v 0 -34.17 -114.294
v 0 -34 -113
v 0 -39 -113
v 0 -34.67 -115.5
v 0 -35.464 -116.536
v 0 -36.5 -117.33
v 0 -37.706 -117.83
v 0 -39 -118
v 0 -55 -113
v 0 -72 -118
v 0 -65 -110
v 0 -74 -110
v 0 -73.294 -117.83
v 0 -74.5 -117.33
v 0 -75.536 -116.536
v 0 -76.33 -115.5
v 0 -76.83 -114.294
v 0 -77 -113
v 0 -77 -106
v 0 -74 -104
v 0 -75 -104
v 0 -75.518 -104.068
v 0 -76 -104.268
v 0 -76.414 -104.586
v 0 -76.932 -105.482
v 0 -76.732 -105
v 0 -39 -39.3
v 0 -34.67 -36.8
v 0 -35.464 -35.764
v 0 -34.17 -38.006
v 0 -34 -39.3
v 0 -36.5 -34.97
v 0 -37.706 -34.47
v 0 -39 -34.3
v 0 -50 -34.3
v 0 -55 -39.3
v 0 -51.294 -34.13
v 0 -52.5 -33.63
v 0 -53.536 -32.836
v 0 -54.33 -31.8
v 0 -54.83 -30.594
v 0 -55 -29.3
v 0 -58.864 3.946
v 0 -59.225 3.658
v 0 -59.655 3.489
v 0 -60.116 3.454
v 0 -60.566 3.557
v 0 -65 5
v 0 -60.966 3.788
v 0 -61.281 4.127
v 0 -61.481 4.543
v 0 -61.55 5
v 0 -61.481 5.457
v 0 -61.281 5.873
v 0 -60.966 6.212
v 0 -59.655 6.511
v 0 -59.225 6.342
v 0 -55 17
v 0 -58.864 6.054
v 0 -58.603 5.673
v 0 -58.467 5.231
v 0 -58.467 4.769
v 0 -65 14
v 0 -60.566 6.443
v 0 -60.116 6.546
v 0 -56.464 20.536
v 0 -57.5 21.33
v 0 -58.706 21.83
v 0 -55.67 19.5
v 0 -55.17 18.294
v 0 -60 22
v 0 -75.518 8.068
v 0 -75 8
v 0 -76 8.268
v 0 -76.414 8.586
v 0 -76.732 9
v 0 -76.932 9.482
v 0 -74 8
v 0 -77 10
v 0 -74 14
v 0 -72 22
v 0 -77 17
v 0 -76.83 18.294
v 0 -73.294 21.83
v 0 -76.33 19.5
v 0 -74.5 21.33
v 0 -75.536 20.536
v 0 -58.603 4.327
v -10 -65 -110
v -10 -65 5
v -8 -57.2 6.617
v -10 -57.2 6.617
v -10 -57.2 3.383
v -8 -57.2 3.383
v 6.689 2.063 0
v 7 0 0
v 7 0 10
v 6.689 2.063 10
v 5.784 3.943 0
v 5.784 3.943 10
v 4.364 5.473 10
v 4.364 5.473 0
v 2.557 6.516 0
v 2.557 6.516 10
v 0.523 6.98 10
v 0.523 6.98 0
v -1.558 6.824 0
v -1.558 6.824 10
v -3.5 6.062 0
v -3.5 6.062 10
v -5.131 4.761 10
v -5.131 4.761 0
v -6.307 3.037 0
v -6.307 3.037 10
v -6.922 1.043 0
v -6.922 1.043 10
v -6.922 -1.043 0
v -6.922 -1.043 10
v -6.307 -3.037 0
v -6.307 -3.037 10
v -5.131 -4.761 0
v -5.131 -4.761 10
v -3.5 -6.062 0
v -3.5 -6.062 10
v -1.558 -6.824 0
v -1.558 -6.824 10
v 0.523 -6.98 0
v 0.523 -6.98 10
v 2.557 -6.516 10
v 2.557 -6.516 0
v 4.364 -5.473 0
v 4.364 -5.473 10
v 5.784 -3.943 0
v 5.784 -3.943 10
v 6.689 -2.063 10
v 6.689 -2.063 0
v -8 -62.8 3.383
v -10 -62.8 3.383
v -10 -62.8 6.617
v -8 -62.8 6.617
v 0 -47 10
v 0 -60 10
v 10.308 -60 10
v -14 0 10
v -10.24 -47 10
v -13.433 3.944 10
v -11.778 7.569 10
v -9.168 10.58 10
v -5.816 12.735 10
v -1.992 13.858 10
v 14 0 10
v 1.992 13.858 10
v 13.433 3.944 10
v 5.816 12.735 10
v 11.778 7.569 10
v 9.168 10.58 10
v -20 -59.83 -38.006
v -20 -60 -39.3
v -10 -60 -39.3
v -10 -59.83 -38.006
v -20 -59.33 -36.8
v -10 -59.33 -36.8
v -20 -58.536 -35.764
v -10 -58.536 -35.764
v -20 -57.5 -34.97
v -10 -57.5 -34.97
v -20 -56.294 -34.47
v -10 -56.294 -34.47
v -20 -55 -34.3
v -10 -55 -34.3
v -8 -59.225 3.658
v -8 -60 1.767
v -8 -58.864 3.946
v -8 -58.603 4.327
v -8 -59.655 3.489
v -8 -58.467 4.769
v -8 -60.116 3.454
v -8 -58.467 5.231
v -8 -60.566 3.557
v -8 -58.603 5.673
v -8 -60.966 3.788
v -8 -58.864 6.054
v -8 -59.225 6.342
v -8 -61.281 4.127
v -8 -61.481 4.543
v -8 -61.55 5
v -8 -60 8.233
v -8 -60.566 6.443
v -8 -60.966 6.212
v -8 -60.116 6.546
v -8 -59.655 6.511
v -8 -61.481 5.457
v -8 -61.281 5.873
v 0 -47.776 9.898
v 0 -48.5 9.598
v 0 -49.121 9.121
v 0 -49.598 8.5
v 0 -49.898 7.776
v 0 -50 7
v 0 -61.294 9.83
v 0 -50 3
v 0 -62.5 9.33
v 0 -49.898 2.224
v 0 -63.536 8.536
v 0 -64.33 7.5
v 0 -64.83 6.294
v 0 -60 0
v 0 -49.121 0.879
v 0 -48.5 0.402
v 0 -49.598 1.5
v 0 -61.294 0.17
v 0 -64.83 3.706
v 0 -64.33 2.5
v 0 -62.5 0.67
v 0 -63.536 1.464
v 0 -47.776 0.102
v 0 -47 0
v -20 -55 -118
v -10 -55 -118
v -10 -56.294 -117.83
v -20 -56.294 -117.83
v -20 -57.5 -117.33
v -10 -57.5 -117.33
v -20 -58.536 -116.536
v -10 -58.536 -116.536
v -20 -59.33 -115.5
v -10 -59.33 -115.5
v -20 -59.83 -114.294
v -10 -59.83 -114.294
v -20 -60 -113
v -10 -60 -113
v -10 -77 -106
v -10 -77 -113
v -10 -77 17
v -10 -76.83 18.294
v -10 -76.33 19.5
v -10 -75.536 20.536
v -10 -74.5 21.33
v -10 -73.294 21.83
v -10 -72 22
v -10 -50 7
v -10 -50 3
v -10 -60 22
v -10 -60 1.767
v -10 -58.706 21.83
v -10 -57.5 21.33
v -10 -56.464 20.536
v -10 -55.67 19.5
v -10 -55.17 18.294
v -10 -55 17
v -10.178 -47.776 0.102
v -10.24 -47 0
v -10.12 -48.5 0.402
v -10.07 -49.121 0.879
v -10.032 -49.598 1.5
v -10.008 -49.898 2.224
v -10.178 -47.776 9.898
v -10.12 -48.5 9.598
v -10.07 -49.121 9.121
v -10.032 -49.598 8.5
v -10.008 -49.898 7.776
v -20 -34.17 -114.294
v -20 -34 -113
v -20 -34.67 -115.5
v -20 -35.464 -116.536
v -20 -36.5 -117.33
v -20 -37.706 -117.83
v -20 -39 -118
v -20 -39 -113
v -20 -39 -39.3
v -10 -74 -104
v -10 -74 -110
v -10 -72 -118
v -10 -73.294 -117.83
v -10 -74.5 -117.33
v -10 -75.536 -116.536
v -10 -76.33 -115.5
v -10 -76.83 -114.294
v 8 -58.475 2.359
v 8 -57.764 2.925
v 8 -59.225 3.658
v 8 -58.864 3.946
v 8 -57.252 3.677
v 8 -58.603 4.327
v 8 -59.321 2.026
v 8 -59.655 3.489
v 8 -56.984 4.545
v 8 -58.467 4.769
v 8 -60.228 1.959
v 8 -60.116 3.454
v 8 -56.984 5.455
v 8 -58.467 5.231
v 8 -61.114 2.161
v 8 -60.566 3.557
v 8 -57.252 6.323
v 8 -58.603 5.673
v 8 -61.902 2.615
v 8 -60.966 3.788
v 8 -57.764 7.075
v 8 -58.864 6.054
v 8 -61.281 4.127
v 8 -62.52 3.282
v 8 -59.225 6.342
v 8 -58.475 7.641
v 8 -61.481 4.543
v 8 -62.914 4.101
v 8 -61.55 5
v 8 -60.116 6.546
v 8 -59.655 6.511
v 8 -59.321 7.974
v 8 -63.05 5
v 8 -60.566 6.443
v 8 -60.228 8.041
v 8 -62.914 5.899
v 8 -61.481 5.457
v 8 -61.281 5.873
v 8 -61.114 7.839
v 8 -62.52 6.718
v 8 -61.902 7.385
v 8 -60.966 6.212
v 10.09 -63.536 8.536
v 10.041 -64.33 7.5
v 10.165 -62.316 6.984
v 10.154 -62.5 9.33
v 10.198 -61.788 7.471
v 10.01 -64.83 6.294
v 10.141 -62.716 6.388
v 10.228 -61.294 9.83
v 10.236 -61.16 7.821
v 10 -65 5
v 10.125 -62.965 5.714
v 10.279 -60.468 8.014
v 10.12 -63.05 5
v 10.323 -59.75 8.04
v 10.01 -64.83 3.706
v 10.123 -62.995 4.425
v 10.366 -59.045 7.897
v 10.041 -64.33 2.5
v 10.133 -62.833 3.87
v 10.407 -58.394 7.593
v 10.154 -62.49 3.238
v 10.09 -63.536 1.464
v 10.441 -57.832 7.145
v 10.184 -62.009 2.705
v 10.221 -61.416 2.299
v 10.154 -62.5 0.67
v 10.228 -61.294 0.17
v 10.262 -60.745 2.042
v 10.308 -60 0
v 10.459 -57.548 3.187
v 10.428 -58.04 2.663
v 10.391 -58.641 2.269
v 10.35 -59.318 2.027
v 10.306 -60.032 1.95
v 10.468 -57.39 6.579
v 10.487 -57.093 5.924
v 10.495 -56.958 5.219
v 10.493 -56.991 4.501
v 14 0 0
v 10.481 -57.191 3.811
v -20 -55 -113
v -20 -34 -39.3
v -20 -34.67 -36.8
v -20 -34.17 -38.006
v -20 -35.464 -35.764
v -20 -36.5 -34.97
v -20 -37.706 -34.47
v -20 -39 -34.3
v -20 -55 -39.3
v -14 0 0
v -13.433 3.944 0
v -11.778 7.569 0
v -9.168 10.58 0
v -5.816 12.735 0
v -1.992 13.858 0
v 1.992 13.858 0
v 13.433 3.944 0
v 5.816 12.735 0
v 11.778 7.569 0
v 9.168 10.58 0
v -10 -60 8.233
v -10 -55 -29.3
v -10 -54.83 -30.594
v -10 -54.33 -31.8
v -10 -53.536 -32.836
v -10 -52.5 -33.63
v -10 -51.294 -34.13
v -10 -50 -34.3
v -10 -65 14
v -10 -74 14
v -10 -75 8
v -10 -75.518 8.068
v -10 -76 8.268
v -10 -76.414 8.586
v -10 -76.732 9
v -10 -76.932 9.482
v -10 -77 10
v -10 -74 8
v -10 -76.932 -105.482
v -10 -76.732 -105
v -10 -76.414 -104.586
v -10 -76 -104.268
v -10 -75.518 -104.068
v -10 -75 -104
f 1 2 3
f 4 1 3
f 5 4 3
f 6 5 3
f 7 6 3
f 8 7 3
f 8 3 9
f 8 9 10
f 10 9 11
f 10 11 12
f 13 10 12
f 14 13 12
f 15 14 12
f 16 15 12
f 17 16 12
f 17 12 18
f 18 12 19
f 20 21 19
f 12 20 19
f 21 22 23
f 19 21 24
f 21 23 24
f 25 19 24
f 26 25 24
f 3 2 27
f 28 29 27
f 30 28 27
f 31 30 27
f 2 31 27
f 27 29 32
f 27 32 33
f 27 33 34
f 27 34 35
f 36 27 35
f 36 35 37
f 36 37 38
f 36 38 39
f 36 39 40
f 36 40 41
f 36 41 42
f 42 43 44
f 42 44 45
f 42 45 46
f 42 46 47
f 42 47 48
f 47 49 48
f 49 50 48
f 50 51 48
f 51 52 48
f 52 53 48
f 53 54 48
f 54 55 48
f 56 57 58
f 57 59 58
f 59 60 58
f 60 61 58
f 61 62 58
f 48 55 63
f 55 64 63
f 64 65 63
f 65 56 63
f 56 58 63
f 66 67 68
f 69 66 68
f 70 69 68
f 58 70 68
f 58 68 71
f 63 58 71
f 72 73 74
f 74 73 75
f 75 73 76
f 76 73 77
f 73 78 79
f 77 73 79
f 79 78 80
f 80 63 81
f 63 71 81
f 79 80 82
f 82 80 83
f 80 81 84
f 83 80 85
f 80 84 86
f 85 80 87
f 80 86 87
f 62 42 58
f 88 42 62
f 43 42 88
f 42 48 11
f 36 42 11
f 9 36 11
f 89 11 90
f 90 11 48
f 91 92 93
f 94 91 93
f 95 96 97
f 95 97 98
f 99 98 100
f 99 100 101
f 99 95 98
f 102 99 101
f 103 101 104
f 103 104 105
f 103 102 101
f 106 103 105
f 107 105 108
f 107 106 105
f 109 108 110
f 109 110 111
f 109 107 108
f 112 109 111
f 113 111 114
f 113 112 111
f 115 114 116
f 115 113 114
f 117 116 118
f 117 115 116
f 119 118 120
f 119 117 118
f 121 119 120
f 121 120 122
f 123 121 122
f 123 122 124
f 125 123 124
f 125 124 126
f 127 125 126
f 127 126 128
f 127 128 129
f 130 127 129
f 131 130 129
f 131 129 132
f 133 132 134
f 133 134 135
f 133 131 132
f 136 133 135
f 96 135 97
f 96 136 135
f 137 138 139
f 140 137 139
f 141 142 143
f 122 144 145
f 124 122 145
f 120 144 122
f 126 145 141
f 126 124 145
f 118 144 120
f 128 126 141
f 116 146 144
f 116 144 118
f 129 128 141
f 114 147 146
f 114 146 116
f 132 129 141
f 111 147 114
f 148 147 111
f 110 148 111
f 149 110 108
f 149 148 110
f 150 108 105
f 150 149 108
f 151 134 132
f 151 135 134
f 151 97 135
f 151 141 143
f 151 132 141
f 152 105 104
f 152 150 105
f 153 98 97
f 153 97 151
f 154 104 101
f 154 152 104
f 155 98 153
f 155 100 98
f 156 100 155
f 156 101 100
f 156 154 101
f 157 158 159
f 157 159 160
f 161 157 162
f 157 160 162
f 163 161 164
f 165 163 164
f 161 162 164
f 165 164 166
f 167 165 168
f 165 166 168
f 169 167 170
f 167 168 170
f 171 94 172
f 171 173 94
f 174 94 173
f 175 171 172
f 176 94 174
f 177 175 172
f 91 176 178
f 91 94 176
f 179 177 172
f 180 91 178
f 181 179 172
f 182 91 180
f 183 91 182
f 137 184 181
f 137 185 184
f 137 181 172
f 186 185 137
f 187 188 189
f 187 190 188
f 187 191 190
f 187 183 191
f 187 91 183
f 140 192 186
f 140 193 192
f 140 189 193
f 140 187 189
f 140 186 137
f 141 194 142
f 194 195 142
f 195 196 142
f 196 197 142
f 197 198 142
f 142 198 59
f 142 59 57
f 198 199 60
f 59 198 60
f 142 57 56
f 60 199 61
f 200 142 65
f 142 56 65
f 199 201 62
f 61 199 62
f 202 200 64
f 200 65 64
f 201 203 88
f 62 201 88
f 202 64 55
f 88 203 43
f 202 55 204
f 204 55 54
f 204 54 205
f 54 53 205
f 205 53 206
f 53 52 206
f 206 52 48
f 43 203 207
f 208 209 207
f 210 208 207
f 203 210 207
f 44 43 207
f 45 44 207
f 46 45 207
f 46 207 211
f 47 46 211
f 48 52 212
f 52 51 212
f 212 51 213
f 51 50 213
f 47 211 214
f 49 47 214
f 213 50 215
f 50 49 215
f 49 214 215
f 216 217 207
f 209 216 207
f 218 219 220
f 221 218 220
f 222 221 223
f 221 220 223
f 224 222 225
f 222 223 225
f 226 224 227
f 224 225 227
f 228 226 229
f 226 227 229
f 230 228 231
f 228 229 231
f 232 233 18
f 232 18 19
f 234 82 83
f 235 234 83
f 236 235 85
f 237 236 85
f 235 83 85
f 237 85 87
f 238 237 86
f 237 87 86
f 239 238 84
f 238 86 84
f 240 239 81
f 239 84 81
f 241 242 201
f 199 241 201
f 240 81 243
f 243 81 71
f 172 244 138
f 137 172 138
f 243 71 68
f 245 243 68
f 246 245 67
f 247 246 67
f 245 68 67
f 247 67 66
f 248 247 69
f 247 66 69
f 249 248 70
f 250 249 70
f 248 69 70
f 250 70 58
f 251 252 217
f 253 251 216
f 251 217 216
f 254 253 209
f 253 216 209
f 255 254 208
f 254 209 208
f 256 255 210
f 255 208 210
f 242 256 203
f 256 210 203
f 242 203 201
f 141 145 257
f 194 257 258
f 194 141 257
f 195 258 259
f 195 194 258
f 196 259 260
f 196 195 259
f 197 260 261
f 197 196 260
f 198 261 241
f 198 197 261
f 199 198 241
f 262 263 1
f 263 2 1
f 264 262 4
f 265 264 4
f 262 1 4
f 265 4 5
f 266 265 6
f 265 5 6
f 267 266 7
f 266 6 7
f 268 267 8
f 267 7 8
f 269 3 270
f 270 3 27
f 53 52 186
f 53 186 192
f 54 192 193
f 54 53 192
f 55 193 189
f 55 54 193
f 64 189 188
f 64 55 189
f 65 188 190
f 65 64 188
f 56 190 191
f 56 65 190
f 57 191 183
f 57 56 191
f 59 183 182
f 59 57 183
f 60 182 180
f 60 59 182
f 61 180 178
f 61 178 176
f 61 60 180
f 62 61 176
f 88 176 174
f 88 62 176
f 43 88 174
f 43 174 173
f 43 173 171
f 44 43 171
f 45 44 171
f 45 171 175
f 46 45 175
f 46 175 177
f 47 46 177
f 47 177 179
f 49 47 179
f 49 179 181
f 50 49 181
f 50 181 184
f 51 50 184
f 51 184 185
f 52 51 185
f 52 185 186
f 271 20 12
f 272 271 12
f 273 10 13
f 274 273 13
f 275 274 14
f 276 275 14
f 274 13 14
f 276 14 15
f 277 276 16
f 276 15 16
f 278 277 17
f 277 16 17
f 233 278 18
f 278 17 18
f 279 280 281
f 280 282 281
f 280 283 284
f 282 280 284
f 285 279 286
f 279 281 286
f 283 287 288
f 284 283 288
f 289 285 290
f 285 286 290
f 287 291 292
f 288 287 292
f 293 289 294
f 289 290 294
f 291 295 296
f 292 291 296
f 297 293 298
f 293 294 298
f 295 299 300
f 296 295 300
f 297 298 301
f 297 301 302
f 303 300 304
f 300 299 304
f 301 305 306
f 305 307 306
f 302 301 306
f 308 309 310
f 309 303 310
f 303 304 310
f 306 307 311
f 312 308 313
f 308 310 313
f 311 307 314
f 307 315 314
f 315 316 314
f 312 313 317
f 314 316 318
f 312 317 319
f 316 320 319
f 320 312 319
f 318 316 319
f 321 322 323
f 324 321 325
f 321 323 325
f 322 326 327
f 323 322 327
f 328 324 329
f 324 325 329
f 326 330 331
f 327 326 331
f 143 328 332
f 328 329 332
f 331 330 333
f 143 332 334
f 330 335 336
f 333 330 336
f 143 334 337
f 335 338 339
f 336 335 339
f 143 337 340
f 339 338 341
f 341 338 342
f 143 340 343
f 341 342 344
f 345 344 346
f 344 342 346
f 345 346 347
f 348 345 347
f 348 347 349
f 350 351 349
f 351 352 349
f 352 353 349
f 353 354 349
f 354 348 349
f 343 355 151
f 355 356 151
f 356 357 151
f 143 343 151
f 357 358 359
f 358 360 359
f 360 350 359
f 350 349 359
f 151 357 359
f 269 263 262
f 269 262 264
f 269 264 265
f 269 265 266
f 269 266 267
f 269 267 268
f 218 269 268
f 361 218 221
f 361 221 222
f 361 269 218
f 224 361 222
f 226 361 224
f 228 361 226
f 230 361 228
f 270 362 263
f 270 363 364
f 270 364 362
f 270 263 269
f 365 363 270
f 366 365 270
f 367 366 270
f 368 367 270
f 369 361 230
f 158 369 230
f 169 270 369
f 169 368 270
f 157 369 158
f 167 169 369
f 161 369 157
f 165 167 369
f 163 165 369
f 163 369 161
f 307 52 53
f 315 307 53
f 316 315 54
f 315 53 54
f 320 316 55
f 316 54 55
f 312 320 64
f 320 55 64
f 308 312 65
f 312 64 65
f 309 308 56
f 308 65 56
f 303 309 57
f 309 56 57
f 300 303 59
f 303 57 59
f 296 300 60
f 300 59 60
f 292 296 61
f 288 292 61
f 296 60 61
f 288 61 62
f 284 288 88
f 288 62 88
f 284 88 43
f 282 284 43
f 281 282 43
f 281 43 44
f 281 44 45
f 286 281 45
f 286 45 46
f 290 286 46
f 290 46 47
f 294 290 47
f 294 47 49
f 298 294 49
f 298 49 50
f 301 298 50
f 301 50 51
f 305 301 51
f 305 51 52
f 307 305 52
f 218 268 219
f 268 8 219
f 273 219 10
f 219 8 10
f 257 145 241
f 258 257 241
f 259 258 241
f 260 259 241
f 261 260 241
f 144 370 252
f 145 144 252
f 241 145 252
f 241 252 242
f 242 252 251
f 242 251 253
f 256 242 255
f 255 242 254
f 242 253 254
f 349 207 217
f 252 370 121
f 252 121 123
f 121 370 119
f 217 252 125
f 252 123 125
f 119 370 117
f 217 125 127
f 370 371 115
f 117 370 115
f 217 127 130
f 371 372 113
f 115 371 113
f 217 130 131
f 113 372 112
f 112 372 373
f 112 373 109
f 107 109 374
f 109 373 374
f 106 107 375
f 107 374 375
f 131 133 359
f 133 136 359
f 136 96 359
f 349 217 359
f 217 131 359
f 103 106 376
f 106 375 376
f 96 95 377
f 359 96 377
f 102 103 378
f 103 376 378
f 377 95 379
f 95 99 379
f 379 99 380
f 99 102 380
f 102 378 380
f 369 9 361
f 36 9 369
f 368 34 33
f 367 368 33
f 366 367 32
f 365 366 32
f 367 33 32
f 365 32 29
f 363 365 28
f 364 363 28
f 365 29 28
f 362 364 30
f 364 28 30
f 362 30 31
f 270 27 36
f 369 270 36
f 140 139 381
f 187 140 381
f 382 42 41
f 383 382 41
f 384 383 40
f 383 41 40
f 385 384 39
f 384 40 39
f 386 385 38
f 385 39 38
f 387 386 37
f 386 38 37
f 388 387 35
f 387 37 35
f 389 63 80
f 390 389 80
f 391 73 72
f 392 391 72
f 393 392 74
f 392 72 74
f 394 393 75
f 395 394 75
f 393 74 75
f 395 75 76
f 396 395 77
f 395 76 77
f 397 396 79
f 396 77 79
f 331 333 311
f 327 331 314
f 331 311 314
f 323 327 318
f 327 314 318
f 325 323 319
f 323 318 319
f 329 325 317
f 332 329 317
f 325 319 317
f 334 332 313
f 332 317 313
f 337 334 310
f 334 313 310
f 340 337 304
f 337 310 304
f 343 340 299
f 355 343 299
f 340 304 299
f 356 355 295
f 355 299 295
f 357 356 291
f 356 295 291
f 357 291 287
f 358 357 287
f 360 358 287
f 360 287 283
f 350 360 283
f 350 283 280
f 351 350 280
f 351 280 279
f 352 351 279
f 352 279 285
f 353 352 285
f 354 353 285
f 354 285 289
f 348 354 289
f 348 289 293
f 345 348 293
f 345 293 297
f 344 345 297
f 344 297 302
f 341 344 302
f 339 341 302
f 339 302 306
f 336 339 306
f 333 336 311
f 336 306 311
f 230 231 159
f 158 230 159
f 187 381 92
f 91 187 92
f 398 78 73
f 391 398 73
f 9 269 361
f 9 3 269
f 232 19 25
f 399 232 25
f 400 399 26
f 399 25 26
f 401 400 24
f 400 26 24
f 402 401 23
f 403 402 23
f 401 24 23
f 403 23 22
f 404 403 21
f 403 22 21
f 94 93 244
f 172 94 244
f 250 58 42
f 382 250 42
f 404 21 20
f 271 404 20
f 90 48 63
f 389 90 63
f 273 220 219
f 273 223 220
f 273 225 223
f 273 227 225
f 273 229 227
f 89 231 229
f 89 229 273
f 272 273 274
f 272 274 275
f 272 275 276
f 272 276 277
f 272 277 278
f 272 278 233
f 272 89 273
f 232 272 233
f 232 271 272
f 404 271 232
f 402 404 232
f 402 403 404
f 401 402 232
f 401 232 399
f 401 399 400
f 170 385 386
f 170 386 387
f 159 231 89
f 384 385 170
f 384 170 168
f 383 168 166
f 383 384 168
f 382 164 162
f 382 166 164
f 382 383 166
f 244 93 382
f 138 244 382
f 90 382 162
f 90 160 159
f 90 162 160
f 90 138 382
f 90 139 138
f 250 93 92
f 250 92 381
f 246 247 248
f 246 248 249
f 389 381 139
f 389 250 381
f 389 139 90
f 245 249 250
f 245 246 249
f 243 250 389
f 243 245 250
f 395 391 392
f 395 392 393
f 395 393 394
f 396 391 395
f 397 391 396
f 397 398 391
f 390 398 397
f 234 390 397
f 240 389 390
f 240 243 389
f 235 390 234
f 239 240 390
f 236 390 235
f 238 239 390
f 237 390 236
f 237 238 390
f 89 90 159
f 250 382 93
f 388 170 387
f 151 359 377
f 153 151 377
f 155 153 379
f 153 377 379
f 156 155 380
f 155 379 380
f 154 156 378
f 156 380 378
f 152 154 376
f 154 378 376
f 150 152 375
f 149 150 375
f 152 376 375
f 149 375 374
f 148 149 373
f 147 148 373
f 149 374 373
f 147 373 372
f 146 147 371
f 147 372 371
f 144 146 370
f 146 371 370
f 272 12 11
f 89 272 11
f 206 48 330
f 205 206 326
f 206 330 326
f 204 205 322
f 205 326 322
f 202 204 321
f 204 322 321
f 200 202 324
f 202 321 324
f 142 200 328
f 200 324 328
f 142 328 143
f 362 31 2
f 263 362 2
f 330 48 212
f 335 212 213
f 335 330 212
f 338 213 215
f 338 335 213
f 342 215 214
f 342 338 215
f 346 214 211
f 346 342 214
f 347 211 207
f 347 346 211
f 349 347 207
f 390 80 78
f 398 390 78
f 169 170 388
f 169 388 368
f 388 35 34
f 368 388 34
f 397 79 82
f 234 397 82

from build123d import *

# Parameters (mm, degrees)
F0_R      = 7
F1_DEPTH  = 10
F2_R      = 4.99999
F3_R      = 1.55
F4_DEPTH  = 11.4030769231
F5_START  = -8
F3_R_2    = 3.05
F5_DEPTH  = 4
F6_R      = 1.55
F7_DEPTH  = 10
F8_R      = 1.55
F9_DEPTH  = 2
F10_R     = 3
F11_W     = 16
F11_H     = 73.7
F12_DEPTH = 10


# Not quite as in the source:
# - a fillet or chamfer is up to 0.001 mm smaller than in the source, because OpenCascade refuses the exact size
# - ends of sketch curves that miss each other by under 0.0002 mm in the source are joined
# - a feature names something its author has since deleted; it is built from what else it names


with BuildPart() as f1:
    # F0 (on Top) → F1 (new body)
    with BuildSketch(Plane.XY):
        with BuildLine():
            Line((10, -65), (14, 0))
            ThreePointArc((14, 0), (0, 14), (-14, 0))
            Line((-14, 0), (-10, -50))
            Line((-10, -50), (0, -50))
            Line((0, -50), (0, -65))
            Line((0, -65), (10, -65))
        make_face()
        Circle(F0_R, mode=Mode.SUBTRACT)
    extrude(amount=F1_DEPTH)

    # F2 (radius 5 in the source; OpenCascade refuses exactly that, so slightly less here)
    f2_edges = [f1.edges().sort_by_distance(p)[0] for p in [
        (5, -65, 10),
        (5, -65, 0),
    ]]
    fillet(f2_edges, radius=F2_R)

    # F3 (on face) → F4 (cut, up to face)
    with BuildSketch(Plane(origin=(0, 0, 0), x_dir=(0, -1, 0), z_dir=(-1, 0, 0))):
        with Locations((60, 5)):
            Circle(F3_R)
    extrude(amount=-F4_DEPTH, mode=Mode.SUBTRACT)

    # F3 (on face) → F5 (cut)
    with BuildSketch(Plane(origin=(0, 0, 0), x_dir=(0, -1, 0), z_dir=(-1, 0, 0)).offset(F5_START)):
        with Locations((60, 5)):
            Circle(F3_R_2)
        with Locations((60, 5)):
            Circle(F3_R, mode=Mode.SUBTRACT)
    extrude(amount=-F5_DEPTH, mode=Mode.SUBTRACT)

    # F10
    f10_edges = [f1.edges().sort_by_distance(p)[0] for p in [
        (-5, -50, 10),
        (-5, -50, 0),
    ]]
    fillet(f10_edges, radius=F10_R)


with BuildPart() as f7:
    # F6 (on face) → F7 (new body)
    with BuildSketch(Plane(origin=(0, 0, 0), x_dir=(0, -1, 0), z_dir=(-1, 0, 0))):
        with BuildLine():
            ThreePointArc((60.00001, 0), (63.5355368349, 1.4644631651), (65, 4.99999))
            ThreePointArc((65, 4.99999), (63.5355368349, 8.5355368349), (60.00001, 10))
            Line((60.00001, 10), (55, 10))
            Line((55, 10), (55, 0))
            Line((55, 0), (60.00001, 0))
        make_face()
        with Locations((60, 5)):
            Circle(F6_R, mode=Mode.SUBTRACT)
        with BuildLine():
            Line((74, -110), (65, -110))
            Line((65, -110), (65, 5))
            ThreePointArc((65, 5), (63.5355368349, 1.4644631651), (60.00001, 0))
            Line((60.00001, 0), (55, 0))
            Line((55, 0), (55, -29.3))
            ThreePointArc((55, -29.3), (53.5355339059, -32.8355339059), (50, -34.3))
            Line((50, -34.3), (39, -34.3))
            ThreePointArc((39, -34.3), (35.4644660941, -35.7644660941), (34, -39.3))
            Line((34, -39.3), (34, -113))
            ThreePointArc((34, -113), (35.4644660941, -116.5355339059), (39, -118))
            Line((39, -118), (72, -118))
            ThreePointArc((72, -118), (75.5355339059, -116.5355339059), (77, -113))
            Line((77, -113), (77, -106))
            ThreePointArc((77, -106), (76.4142135624, -104.5857864376), (75, -104))
            Line((75, -104), (74, -104))
            Line((74, -104), (74, -110))
        make_face()
        Polygon((55, -39.3), (55, -110), (55, -113), (39, -113), (39, -39.3), align=None, mode=Mode.SUBTRACT)
        with BuildLine():
            ThreePointArc((60.00001, 10), (63.5355368349, 8.5355368349), (65, 5.00001))
            Line((65, 5.00001), (65, 14))
            Line((65, 14), (74, 14))
            Line((74, 14), (74, 8))
            Line((74, 8), (75, 8))
            ThreePointArc((75, 8), (76.4142135624, 8.5857864376), (77, 10))
            Line((77, 10), (77, 17))
            ThreePointArc((77, 17), (75.5355339059, 20.5355339059), (72, 22))
            Line((72, 22), (60, 22))
            ThreePointArc((60, 22), (56.4644660941, 20.5355339059), (55, 17))
            Line((55, 17), (55, 14))
            Line((55, 14), (55, 10))
            Line((55, 10), (60.00001, 10))
        make_face()
    extrude(amount=F7_DEPTH)

    # F8 (on face) → F9 (cut)
    with BuildSketch(Plane(origin=(-10, 0, 0), x_dir=(0, -1, 0), z_dir=(-1, 0, 0))):
        Polygon((62.8, 3.3834192463), (62.8, 6.6165807537), (60, 8.2331615075), (57.2, 6.6165807537), (57.2, 3.3834192463), (60, 1.7668384925), align=None)
        with Locations((60, 5)):
            Circle(F8_R, mode=Mode.SUBTRACT)
    extrude(amount=-F9_DEPTH, mode=Mode.SUBTRACT)

    # F11 (on face) → F12 (join)
    with BuildSketch(Plane(origin=(-10, 0, 0), x_dir=(0, -1, 0), z_dir=(-1, 0, 0))):
        with BuildLine():
            Line((34, -39.3), (34, -113))
            ThreePointArc((34, -113), (35.4644660941, -116.5355339059), (39, -118))
            Line((39, -118), (55, -118))
            ThreePointArc((55, -118), (58.5355339059, -116.5355339059), (60, -113))
            Line((60, -113), (60, -39.3))
            ThreePointArc((60, -39.3), (58.5355339059, -35.7644660941), (55, -34.3))
            Line((55, -34.3), (50, -34.3))
            Line((50, -34.3), (39, -34.3))
            ThreePointArc((39, -34.3), (35.4644660941, -35.7644660941), (34, -39.3))
        make_face()
        with Locations((47, -76.15)):
            Rectangle(F11_W, F11_H, mode=Mode.SUBTRACT)
    extrude(amount=F12_DEPTH)


solid = Compound([f1.part, f7.part])
